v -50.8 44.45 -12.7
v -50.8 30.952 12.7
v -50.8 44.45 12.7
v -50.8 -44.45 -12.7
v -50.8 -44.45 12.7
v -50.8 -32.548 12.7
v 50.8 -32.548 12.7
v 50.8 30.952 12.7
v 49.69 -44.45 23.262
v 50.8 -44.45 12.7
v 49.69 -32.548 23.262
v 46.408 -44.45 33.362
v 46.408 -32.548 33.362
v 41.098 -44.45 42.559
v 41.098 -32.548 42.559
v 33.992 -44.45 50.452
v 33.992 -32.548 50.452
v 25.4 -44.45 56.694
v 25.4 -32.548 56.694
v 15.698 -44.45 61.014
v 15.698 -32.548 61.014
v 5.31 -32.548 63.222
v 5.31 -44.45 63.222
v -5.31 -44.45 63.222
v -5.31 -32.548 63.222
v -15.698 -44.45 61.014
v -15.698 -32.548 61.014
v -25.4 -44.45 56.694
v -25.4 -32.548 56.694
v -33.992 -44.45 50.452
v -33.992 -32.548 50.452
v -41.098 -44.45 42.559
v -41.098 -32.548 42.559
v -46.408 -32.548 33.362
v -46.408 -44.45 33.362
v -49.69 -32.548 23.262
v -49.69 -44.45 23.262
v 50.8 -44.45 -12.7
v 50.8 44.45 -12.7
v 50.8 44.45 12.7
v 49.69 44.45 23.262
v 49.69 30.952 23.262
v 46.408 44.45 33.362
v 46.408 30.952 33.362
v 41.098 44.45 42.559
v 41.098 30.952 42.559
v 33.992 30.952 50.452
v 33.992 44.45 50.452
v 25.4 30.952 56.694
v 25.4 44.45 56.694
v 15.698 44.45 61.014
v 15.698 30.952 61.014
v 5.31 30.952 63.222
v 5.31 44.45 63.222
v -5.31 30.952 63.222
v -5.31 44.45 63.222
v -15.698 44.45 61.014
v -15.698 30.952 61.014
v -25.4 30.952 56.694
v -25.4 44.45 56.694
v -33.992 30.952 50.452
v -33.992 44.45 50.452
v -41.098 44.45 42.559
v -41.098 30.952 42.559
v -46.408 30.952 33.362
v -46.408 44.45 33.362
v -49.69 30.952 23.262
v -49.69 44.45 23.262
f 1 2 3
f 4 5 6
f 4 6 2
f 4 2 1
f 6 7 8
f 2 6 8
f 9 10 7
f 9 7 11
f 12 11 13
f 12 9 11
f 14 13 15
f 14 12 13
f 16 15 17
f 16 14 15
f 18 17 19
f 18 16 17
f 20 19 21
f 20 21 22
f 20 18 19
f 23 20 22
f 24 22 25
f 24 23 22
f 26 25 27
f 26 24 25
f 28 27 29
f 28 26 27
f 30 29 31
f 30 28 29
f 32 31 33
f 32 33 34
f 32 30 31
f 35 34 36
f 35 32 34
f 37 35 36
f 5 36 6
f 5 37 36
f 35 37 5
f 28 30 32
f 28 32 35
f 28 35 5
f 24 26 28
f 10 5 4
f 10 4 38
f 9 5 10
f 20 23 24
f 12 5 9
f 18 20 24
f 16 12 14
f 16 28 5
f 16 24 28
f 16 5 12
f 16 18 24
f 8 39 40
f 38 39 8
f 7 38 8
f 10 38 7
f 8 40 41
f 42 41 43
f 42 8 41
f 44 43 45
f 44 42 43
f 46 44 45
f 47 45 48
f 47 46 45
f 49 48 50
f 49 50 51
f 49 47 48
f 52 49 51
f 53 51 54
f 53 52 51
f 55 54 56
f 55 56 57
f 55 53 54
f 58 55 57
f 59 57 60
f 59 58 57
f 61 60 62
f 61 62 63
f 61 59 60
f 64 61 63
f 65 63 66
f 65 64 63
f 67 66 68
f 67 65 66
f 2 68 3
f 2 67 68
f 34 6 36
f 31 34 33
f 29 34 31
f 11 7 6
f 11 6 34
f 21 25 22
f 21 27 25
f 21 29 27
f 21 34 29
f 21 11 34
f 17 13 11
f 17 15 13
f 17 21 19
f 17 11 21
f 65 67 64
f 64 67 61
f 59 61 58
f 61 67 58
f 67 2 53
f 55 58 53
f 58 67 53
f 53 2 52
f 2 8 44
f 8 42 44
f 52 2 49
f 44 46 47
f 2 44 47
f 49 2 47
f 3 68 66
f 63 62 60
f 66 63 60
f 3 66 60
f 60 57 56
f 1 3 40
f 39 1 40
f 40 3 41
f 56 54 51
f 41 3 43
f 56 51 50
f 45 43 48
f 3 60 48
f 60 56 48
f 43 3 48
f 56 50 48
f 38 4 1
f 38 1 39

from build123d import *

# Parameters (mm, degrees)
F1_DEPTH = 44.45
F2_W     = 63.5
F2_H     = 50.8
F3_DEPTH = 50.8


with BuildPart() as f1:
    # F0 (on Front) → F1 (new body, symmetric)
    with BuildSketch(Plane.XZ):
        with BuildLine():
            Line((-50.8, 12.7), (-50.8, -12.7))
            Line((-50.8, -12.7), (50.8, -12.7))
            Line((50.8, -12.7), (50.8, 12.7))
            ThreePointArc((50.8, 12.7), (0, 63.5), (-50.8, 12.7))
        make_face()
    extrude(amount=F1_DEPTH, both=True)

    # F2 (on Right) → F3 (cut, symmetric)
    with BuildSketch(Plane.YZ):
        with Locations((-0.797947, 38.1)):
            Rectangle(F2_W, F2_H)
    extrude(amount=F3_DEPTH, both=True, mode=Mode.SUBTRACT)


solid = f1.part
